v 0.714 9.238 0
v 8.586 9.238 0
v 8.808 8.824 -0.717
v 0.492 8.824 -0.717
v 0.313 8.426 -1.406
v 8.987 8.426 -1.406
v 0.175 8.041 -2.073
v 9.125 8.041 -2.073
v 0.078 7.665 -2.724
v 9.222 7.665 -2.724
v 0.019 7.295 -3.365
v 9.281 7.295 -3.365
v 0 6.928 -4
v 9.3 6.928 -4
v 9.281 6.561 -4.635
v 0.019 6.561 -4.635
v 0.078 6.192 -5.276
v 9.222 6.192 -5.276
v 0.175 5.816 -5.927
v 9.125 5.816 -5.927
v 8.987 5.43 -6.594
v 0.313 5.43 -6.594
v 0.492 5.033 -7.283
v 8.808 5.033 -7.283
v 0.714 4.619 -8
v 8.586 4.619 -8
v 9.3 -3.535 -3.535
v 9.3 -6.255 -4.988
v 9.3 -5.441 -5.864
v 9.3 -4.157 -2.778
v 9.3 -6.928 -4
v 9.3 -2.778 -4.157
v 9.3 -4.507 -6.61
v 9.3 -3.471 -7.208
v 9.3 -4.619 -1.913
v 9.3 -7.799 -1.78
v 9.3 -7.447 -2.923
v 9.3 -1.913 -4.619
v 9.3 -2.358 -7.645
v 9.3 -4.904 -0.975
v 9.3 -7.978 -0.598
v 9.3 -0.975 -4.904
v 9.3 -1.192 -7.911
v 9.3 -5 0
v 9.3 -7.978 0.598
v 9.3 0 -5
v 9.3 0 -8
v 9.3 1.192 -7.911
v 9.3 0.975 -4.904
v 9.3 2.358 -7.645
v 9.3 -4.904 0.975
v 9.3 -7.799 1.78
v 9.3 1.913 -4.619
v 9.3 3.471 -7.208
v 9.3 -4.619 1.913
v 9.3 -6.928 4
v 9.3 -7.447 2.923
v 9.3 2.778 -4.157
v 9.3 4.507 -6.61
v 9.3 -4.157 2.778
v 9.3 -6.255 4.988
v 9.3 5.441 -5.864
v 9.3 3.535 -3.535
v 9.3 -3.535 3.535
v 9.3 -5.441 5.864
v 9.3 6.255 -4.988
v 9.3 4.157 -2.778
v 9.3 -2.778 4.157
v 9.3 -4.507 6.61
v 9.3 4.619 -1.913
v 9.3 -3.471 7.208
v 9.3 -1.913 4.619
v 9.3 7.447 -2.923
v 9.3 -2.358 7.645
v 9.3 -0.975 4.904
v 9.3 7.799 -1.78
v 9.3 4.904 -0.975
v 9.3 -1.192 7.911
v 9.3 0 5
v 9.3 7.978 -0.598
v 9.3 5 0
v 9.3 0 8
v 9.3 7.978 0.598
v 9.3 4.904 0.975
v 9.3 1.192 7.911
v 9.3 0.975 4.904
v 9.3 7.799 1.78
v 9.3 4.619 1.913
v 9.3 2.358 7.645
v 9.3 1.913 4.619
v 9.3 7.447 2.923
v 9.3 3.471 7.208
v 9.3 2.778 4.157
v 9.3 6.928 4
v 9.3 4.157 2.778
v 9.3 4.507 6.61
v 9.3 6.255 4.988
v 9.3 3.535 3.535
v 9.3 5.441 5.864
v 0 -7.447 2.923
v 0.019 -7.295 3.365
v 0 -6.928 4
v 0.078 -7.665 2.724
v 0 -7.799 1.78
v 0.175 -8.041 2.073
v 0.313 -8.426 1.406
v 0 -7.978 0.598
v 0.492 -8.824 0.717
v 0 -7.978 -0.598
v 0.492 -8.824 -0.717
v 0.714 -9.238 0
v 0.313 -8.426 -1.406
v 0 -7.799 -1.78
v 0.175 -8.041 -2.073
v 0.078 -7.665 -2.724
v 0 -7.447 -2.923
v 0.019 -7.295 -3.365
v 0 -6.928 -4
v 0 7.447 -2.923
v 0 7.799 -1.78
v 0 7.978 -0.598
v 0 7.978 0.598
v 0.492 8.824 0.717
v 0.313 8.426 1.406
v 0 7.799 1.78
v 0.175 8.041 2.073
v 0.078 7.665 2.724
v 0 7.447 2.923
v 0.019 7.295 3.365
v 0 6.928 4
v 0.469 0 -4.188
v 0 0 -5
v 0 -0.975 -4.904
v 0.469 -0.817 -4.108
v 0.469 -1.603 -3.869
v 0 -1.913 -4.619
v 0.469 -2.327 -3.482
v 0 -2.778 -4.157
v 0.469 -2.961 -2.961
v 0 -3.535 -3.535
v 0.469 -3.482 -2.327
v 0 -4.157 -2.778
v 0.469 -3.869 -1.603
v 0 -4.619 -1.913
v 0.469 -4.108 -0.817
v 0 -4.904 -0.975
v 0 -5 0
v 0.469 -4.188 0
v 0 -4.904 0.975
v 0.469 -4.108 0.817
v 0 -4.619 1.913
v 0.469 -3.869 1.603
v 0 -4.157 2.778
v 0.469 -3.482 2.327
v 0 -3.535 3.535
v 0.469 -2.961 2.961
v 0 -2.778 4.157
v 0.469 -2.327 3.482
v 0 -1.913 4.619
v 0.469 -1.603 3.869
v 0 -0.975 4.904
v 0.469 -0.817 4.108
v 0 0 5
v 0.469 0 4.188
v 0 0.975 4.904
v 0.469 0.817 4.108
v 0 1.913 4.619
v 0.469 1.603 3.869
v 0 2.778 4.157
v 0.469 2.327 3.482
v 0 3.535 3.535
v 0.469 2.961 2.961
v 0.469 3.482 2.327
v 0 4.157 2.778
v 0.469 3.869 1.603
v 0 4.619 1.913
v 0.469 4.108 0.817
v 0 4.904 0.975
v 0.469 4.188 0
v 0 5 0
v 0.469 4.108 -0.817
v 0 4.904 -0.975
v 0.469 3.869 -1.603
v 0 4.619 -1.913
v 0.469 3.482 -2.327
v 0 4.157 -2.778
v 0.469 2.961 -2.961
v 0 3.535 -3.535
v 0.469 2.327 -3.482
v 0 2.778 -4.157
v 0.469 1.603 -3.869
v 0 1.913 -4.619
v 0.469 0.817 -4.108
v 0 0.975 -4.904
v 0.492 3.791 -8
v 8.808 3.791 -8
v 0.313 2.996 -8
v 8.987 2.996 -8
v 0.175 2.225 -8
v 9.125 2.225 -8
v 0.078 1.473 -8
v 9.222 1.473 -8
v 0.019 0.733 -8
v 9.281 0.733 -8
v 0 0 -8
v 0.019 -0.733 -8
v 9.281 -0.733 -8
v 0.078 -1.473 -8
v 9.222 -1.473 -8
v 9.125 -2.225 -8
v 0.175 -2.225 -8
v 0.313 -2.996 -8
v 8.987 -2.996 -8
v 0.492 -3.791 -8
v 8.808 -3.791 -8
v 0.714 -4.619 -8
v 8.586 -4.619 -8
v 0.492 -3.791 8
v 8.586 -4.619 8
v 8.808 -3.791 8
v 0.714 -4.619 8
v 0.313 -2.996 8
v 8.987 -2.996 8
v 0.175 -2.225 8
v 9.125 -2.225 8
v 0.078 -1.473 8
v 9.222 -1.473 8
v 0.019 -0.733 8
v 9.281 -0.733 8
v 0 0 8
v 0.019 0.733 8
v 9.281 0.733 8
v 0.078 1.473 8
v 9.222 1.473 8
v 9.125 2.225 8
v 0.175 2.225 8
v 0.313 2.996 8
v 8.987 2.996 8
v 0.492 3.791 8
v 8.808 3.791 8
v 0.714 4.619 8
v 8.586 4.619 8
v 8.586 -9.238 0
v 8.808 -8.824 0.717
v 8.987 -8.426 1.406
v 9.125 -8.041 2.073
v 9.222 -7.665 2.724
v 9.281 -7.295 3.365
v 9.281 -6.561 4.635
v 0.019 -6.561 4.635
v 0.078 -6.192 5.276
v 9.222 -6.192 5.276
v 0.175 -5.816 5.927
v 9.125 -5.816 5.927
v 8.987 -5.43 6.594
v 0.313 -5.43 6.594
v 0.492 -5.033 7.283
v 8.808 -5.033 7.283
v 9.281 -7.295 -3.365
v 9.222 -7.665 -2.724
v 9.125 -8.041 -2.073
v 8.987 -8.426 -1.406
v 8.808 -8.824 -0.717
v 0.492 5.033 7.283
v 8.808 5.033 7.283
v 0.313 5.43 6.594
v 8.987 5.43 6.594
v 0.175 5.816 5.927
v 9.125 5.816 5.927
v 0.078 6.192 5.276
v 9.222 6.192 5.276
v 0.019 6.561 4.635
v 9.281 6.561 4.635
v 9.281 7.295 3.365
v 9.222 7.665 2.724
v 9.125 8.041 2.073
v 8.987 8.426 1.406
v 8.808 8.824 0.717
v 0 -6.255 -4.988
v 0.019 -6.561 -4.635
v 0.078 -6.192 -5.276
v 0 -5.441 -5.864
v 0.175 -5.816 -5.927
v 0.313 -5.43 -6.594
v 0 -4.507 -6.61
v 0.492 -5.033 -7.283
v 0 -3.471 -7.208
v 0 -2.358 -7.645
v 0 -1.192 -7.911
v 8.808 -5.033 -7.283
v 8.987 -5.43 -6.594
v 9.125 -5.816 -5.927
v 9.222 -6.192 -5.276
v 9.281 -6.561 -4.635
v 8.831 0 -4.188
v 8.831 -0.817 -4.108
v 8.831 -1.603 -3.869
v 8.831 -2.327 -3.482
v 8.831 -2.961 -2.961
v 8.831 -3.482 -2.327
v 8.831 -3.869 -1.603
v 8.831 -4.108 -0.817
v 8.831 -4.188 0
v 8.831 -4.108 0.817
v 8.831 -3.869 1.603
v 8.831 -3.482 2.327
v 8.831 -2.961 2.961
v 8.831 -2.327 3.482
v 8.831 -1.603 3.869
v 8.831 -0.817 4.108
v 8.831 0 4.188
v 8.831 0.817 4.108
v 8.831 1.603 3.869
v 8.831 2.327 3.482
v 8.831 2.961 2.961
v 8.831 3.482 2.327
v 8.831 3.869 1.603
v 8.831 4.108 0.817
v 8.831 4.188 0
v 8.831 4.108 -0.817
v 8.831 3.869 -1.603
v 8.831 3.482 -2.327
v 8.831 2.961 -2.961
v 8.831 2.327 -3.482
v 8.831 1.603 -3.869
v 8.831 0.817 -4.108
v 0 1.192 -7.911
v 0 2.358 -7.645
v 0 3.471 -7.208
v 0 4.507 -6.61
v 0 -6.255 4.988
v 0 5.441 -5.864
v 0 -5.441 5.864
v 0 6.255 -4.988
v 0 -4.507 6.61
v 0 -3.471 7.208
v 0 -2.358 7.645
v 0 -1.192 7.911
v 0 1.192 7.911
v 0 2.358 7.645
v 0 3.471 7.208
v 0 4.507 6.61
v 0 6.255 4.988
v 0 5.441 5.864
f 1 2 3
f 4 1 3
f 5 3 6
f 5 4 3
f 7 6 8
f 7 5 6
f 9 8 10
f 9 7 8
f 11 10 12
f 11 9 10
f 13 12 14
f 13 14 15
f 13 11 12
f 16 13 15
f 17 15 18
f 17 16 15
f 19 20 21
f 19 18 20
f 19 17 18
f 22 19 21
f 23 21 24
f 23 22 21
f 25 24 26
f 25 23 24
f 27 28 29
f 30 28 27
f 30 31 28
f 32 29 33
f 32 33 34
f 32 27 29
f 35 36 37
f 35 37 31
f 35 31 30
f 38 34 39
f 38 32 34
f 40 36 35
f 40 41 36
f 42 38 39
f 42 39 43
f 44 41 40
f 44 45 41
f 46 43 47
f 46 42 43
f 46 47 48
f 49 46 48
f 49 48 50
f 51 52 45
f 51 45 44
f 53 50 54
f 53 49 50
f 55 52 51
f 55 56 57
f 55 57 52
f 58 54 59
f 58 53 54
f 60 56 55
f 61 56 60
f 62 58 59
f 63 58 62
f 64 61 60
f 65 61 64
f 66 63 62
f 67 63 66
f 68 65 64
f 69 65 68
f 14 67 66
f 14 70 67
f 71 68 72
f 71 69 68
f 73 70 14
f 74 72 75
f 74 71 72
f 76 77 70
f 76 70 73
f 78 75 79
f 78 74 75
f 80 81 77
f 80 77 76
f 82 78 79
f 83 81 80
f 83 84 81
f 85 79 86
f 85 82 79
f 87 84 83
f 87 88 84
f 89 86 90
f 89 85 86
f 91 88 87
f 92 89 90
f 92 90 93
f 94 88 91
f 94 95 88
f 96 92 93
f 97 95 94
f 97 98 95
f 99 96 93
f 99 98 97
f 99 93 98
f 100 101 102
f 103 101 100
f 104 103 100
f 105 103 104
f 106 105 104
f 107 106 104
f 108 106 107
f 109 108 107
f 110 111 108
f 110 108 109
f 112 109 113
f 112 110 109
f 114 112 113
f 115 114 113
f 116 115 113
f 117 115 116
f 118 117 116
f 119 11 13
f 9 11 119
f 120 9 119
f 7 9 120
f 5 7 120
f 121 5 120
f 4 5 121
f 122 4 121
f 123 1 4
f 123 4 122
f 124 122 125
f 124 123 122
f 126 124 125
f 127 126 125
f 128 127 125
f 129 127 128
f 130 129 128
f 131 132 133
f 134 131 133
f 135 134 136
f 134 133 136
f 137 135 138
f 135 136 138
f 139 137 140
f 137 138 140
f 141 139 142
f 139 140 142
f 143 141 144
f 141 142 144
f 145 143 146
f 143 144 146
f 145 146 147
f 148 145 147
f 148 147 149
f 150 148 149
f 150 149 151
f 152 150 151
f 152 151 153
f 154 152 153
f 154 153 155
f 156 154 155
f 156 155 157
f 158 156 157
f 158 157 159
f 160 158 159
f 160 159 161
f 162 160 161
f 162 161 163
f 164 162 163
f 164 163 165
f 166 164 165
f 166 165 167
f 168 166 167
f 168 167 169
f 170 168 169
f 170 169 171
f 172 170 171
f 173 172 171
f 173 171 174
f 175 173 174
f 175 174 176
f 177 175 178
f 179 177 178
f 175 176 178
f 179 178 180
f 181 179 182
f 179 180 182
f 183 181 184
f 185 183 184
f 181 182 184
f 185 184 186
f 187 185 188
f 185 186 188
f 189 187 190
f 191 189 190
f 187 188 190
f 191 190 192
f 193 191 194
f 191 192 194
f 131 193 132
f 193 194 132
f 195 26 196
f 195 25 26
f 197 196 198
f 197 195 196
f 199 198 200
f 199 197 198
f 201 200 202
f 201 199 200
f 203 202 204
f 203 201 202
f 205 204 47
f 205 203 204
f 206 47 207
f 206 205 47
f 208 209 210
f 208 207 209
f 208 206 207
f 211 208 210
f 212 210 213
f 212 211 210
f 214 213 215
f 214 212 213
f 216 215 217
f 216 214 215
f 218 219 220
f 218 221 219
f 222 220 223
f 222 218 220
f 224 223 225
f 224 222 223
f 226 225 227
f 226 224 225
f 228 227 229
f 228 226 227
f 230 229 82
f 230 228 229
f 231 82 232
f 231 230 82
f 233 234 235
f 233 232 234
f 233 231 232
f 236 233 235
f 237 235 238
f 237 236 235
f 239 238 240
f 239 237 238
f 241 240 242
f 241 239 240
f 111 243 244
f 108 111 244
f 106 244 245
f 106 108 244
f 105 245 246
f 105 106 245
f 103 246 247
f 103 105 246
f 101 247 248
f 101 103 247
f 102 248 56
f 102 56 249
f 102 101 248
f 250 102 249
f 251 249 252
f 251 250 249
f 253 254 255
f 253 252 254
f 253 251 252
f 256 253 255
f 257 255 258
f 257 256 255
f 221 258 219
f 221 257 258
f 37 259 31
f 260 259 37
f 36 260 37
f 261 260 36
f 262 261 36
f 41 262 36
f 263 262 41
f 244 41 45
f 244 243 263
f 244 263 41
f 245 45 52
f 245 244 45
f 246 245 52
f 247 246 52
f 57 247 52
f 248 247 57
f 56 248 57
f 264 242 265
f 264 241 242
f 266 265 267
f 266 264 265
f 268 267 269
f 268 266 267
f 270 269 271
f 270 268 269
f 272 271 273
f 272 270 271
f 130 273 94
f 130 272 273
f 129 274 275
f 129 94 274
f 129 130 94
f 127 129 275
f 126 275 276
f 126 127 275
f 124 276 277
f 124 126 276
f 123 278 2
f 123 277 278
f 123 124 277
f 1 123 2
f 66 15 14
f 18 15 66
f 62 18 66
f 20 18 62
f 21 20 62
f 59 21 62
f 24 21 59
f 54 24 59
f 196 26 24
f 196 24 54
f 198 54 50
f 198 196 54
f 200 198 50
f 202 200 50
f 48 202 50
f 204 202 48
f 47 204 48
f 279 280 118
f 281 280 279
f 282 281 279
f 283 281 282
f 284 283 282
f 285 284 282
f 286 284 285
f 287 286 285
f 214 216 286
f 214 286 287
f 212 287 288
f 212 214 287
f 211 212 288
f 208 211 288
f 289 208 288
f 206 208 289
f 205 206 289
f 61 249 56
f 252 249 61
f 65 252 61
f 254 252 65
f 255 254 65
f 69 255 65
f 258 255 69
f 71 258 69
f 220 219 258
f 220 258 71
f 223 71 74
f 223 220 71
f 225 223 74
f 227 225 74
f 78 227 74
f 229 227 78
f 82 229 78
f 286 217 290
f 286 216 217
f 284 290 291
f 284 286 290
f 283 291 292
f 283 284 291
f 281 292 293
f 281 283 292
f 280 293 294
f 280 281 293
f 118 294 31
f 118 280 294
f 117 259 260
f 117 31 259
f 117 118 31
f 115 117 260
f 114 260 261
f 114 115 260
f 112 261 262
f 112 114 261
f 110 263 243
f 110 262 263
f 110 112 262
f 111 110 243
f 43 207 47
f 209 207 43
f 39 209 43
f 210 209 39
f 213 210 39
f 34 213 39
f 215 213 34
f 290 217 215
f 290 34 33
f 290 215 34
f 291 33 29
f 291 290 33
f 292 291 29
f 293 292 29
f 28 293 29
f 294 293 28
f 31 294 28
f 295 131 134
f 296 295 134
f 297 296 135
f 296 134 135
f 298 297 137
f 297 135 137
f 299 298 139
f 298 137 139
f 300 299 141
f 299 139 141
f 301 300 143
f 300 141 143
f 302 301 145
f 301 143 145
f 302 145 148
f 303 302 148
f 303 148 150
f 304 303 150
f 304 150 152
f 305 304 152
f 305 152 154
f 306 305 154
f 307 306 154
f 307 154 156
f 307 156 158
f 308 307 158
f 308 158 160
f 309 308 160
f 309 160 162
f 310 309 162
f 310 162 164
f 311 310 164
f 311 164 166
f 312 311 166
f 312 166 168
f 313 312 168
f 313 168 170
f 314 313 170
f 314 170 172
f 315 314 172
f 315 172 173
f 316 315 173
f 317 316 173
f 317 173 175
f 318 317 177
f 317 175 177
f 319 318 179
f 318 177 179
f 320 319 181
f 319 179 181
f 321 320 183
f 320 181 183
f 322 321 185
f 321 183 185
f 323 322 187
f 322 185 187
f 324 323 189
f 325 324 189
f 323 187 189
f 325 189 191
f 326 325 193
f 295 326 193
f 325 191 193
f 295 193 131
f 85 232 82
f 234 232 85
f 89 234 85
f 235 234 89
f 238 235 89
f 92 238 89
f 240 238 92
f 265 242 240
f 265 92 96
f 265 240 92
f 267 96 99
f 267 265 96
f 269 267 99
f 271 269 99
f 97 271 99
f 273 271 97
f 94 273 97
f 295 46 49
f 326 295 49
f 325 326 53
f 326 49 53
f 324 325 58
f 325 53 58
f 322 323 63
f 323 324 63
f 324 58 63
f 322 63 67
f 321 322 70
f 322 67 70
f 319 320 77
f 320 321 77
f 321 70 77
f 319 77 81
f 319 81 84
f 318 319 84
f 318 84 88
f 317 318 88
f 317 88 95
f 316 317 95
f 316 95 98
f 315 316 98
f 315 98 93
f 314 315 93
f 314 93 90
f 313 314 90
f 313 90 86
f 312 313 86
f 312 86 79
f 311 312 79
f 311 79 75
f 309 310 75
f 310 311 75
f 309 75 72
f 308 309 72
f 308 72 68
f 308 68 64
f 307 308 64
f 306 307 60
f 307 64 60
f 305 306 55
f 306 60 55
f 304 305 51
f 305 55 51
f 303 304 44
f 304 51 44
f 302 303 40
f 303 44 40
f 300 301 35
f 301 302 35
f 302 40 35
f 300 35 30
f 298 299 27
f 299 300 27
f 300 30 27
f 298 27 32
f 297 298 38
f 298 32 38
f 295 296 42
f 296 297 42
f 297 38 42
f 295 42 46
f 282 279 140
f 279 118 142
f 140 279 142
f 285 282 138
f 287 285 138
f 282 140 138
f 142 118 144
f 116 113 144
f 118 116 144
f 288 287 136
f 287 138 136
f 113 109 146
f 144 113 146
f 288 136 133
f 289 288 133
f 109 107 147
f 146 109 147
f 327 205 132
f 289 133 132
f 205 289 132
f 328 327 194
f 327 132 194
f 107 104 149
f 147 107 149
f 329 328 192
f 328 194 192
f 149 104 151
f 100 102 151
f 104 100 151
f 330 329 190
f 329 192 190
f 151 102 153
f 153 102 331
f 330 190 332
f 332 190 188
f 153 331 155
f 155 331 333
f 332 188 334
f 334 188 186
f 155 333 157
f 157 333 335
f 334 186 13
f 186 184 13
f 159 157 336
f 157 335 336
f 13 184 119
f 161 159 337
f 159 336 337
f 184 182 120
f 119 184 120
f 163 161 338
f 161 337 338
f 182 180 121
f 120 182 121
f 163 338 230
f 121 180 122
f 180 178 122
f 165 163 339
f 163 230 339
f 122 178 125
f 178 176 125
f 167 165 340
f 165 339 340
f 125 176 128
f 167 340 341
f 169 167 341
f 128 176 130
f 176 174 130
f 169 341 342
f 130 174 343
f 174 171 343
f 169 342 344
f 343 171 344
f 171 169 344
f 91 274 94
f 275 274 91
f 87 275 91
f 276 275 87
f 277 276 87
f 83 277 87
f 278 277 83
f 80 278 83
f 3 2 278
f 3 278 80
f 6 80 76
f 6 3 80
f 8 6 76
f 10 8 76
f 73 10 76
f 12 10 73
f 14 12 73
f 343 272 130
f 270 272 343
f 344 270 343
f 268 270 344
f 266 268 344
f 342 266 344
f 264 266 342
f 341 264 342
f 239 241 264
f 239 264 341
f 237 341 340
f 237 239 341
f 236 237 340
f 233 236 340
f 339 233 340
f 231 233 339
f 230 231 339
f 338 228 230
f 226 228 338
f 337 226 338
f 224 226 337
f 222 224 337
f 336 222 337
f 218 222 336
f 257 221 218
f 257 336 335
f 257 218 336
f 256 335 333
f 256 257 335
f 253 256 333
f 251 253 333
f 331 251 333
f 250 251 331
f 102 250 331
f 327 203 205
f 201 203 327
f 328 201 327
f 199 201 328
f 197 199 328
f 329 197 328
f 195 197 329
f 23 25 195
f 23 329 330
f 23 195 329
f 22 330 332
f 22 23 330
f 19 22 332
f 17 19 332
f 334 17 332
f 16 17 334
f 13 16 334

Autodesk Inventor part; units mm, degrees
ref_plane "YZ Plane" through (0, 0, 0) normal (1, 0, 0) x (0, 1, 0)
ref_plane "XZ Plane" through (0, 0, 0) normal (0, 1, 0) x (-1, 0, 0)
sketch "草图1" plane through (0, 0, 0) normal (1, 0, 0) x (0, 1, 0)
  line L0 (-9.2376, 0) -> (-4.6188, 8)
  line L1 (-4.6188, 8) -> (4.6188, 8)
  line L2 (4.6188, 8) -> (9.2376, 0)
  line L3 (9.2376, 0) -> (4.6188, -8)
  line L4 (4.6188, -8) -> (-4.6188, -8)
  line L5 (-4.6188, -8) -> (-9.2376, 0)
  point P0 (0, 0)
  point P1 (0, 0)
  dimension "d0" = 18.4752
extrude "轴承体" add sketch "草图1" along normal blind 9.3
sketch "草图2" plane through (0, 0, 0) normal (0, 0, 1) x (1, 0, 0)
  line L0 (0, 4.6188) -> (0, 9.2376) projected
  line L1 (0, 9.2376) -> (9.3, 9.2376) projected
  line L2 (9.3, 4.6188) -> (9.3, 9.2376) projected
  line L3 (-1.86, 0) -> (11.16, 0) projected
  line L4 (0.7145, 9.2376) -> (0, 8)
  line L5 (8.5855, 9.2376) -> (9.3, 8)
  dimension "d3" = 30
  dimension "d4" = 30
  dimension "d5" = 16
  dimension "d6" = 16
revolve "倒角1" cut sketch "草图2" angle 360 about axis through (-10, 0, 0) along (1, 0, 0)
sketch "草图3" plane through (9.3, 0, 0) normal (1, 0, 0) x (0, 0, -1)
  arc A0 (-4, -6.9282) -> (4, -6.9282) centre (0, 0) ccw projected
hole "螺纹" at (9.3, 0, 0) direction (-1, 0, 0) diameter 8.376 end through all thread size "M10x1.5" designation "M10" class "6H" standard "GB Metric profile"
chamfer "倒角2" distance 0.8119 angle 30 1 edges at (9.3, 0, 4.188) measured on face at (9.3, 6.6899, -0.1683)
chamfer "倒角3" distance 0.8119 angle 30 1 edges at (0, 0, 4.188) measured on face at (0, 6.6899, -0.1683)
ref_plane "Work Plane1" through (-16.85, 0, 0) normal (0, -0.866, -0.5) x (1, 0, 0)
equation "\"d0\" = 1.1547 * SW"
equation "\"d1\" = KOH"
equation "\"d3\" = ANG1"
equation "\"d4\" = ANG2"
equation "\"d5\" = SW0"
equation "\"d6\" = SW01"
equation "\"d8\" = -0.5 * GD1 + 0.5 * NND"
equation "\"d40\" = -0.5 * GD1 + 0.5 * NND"
equation "\"d10\" = -0.5 * GD1 + 0.5 * NND"
equation "\"d41\" = -0.5 * GD1 + 0.5 * NND"
equation "\"ANG1\" = 30deg"
equation "\"ANG2\" = 30deg"
equation "\"KOH\" = 9.3"
equation "\"SW\" = 16"
equation "\"SW0\" = SW"
equation "\"SW01\" = SW"
equation "\"GUL\" = 0.541266 * PTC"
equation "\"TOA\" = 30deg"
equation "\"PTC\" = 1.5"
equation "\"E0\" = 1.155 * SW"
equation "\"GAL\" = 0.541266 * PTC"
equation "\"GD1\" = 8.376202"
equation "\"NND\" = 10"
properties part number "螺母 GB/T 6175 M10" material "钢，软"
